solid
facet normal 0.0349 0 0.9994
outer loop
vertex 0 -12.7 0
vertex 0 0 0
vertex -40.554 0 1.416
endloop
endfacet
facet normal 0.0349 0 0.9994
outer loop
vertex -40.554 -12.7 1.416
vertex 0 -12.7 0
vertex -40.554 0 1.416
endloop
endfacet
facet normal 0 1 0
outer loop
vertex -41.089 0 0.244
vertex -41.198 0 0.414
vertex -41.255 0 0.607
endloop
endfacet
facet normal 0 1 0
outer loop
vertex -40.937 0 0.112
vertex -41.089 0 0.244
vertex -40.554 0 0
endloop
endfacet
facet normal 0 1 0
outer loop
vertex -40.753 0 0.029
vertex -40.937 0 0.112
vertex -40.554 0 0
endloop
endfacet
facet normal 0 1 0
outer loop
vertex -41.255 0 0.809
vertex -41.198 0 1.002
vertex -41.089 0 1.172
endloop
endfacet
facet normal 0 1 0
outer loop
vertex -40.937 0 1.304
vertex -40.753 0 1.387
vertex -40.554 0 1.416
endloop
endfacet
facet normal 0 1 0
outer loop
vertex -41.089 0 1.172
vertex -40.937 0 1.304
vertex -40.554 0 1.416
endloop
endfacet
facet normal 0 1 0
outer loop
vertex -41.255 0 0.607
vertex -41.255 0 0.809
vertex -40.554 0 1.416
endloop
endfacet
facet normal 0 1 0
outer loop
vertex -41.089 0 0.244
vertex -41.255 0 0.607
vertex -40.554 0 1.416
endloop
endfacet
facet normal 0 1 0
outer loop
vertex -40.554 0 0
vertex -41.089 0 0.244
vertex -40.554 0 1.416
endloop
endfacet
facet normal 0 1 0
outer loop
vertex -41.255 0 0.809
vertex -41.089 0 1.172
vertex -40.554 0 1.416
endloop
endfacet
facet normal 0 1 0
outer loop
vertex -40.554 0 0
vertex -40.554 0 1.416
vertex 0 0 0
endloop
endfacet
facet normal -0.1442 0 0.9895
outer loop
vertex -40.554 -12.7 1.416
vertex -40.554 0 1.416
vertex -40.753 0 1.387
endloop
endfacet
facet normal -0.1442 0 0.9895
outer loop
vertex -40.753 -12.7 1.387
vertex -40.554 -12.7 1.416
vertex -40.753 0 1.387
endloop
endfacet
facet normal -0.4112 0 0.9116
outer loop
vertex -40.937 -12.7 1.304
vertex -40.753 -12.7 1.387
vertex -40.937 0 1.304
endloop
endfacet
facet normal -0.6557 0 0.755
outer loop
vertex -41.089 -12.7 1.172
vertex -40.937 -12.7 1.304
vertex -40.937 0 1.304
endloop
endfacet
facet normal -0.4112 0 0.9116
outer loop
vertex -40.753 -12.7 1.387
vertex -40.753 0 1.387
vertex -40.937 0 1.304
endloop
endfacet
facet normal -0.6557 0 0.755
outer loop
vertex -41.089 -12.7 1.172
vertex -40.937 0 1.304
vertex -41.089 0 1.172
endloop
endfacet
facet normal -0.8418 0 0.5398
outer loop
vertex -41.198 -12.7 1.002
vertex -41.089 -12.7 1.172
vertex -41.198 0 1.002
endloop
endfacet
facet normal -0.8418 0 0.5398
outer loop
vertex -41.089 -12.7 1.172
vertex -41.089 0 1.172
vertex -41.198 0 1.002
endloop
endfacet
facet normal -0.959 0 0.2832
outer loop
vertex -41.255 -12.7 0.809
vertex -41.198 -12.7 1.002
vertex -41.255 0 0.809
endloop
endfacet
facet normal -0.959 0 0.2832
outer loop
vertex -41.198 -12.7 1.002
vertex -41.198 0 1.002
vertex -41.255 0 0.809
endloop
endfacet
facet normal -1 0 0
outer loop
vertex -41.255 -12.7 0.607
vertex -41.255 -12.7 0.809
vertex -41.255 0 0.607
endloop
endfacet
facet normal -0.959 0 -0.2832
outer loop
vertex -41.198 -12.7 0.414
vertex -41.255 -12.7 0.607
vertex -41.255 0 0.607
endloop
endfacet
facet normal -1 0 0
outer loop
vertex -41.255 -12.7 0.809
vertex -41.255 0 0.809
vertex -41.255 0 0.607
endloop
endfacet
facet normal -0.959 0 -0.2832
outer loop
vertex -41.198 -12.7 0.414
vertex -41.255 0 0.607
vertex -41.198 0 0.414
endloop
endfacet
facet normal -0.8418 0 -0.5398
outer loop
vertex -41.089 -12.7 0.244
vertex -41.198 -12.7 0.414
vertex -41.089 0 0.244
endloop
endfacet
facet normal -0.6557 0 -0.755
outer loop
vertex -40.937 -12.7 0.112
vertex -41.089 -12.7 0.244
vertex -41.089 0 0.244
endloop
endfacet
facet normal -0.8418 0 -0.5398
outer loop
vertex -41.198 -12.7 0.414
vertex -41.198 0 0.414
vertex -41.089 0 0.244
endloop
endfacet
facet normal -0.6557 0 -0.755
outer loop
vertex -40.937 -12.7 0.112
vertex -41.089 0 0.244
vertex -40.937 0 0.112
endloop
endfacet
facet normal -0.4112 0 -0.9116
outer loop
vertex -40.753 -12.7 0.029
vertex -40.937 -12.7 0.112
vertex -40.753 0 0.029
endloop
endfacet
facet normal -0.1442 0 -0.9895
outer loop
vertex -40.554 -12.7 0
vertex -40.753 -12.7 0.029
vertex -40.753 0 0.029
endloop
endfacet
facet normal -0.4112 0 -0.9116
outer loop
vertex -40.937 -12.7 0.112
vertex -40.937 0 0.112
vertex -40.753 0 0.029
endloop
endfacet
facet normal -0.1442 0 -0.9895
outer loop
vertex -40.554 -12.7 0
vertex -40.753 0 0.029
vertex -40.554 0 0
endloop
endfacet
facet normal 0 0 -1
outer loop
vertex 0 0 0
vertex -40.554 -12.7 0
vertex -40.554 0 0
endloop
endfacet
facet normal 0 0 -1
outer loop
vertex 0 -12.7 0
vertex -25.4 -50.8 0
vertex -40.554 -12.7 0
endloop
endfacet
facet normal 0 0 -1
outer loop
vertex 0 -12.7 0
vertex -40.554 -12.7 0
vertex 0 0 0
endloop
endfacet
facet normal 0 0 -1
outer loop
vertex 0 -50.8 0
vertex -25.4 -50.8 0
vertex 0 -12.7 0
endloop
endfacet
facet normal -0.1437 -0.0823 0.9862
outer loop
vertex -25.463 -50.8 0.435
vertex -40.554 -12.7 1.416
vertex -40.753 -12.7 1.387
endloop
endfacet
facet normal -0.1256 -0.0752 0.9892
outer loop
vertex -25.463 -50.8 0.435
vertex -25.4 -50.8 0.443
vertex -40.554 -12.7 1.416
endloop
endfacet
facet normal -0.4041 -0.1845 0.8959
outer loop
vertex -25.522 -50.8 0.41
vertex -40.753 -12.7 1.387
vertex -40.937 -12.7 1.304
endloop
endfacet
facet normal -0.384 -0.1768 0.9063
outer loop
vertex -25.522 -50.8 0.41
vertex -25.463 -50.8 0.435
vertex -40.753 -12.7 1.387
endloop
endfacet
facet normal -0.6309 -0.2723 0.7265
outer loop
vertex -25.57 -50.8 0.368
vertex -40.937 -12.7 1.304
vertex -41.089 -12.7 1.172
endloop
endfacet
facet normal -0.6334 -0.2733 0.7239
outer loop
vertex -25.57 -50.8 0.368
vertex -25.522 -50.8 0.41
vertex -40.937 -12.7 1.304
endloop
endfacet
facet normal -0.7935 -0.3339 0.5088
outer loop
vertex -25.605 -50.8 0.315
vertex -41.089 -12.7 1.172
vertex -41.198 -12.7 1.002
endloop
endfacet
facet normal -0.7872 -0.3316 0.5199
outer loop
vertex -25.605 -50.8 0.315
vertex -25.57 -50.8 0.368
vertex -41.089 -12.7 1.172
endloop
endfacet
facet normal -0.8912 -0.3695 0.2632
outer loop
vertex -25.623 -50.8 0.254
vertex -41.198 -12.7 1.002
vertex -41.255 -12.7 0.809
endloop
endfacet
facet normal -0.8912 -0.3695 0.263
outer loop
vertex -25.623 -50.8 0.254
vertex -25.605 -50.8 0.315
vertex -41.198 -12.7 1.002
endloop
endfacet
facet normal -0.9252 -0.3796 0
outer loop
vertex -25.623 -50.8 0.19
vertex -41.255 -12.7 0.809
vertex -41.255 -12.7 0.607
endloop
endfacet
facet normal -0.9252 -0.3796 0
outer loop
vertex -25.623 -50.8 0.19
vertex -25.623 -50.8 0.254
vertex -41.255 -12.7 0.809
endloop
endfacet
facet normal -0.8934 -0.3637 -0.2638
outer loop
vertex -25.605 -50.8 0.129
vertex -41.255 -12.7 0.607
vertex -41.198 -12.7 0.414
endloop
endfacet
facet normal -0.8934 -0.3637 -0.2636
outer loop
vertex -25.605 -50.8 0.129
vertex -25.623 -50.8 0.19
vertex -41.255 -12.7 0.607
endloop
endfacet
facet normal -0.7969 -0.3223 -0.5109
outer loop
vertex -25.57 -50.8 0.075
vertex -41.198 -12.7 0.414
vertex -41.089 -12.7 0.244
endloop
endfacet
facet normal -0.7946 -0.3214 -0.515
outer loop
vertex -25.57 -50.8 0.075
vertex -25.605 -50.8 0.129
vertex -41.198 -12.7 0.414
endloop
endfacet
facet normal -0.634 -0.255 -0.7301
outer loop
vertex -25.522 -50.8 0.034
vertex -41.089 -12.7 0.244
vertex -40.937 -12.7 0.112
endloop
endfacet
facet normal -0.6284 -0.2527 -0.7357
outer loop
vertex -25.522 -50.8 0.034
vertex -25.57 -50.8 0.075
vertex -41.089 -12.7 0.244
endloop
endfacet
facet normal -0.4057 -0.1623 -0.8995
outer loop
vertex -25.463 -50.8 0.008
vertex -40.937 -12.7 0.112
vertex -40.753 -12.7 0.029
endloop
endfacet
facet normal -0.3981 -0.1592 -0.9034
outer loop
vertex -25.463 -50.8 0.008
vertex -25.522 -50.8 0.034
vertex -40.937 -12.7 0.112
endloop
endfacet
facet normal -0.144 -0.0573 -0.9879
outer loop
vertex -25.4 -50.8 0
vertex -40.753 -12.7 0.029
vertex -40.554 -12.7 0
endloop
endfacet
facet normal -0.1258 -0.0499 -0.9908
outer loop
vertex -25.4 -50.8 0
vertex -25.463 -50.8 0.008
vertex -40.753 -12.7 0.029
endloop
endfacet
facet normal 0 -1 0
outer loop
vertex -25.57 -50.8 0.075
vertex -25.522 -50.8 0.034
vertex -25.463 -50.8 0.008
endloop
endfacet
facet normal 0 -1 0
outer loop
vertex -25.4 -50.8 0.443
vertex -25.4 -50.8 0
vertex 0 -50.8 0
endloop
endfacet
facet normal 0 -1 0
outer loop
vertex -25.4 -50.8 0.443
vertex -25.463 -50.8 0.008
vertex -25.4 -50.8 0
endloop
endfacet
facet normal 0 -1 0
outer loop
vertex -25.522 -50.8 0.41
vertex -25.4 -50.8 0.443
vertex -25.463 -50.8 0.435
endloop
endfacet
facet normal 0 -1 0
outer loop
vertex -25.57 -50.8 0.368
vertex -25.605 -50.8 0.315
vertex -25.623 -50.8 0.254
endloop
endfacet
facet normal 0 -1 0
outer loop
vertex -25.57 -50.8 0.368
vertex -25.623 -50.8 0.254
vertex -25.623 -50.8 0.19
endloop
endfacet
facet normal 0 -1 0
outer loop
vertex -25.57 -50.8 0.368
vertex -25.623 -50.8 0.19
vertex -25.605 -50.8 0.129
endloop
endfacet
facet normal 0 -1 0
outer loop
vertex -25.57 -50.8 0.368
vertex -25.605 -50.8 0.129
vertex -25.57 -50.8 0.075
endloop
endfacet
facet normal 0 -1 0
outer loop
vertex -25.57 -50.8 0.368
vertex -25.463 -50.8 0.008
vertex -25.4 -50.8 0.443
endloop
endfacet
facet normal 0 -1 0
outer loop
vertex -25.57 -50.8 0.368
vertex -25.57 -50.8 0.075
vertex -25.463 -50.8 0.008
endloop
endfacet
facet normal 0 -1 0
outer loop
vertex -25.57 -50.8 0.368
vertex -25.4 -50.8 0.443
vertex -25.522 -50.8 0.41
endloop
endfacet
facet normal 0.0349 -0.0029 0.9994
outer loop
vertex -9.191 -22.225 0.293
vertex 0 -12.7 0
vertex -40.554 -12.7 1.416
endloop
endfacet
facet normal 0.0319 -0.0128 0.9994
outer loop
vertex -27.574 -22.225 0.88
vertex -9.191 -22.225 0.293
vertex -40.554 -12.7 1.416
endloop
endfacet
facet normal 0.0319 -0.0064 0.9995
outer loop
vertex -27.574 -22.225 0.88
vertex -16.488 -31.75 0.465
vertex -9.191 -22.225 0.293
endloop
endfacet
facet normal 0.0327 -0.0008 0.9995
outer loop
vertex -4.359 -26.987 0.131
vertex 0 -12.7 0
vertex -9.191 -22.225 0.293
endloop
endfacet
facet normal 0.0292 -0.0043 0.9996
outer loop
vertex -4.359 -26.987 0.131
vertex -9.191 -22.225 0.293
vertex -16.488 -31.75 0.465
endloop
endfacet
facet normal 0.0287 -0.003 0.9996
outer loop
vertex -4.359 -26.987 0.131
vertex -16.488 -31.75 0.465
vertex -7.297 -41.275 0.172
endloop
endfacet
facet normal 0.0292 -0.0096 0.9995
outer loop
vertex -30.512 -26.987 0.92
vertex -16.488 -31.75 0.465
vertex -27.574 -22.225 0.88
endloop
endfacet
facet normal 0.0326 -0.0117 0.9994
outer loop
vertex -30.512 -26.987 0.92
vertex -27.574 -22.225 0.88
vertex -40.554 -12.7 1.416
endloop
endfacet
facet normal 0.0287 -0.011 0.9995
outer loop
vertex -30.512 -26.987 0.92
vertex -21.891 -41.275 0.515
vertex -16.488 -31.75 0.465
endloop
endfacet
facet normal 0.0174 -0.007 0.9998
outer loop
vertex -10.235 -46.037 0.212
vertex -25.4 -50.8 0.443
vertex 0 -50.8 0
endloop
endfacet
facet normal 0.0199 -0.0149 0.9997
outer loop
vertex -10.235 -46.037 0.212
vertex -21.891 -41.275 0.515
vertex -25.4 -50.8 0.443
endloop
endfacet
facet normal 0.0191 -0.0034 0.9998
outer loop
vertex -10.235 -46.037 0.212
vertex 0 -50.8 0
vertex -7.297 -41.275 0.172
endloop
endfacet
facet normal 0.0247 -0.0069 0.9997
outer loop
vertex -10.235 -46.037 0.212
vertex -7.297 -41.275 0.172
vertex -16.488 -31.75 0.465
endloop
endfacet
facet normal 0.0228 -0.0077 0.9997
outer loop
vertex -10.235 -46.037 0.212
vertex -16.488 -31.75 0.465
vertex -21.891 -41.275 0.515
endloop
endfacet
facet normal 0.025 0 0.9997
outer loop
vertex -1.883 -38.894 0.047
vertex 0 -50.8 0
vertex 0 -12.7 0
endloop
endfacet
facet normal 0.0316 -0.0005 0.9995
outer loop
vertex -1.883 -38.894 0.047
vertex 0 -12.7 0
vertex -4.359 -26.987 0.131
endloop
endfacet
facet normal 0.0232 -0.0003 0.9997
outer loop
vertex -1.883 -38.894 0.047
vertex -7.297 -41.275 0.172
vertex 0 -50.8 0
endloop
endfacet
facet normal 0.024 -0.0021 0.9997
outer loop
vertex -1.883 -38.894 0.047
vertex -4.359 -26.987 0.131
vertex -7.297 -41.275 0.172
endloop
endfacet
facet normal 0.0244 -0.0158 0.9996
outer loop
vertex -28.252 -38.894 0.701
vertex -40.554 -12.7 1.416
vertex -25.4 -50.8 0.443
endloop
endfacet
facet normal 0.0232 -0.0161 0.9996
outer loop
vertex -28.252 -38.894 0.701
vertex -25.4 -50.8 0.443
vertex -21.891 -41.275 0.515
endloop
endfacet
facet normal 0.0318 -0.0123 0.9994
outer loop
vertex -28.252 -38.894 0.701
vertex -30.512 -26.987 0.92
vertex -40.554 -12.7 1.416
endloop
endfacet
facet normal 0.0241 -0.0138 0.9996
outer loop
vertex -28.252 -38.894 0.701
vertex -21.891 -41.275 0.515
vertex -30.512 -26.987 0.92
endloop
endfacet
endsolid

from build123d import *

# Parameters (mm, degrees)
F2_DEPTH = 12.7


with BuildPart() as f2:
    # F0 (on Front) → F2 (new body)
    with BuildSketch(Plane.XZ):
        with BuildLine():
            Line((-40.553772, 0), (0, 0))
            Line((0, 0), (-40.553772, 1.416169))
            ThreePointArc((-40.553772, 1.416169), (-41.261856, 0.708084), (-40.553772, 0))
        make_face()
    extrude(amount=F2_DEPTH)

    # F2_face (on face) → F4 section 0
    with BuildSketch(Plane(origin=(-27.404725, -12.7, 0.478357), x_dir=(1, 0, 0), z_dir=(0, -1, 0))):
        with BuildLine():
            Line((-13.149047, -0.478357), (27.404725, -0.478357))
            Line((27.404725, -0.478357), (-13.149047, 0.937812))
            ThreePointArc((-13.149047, 0.937812), (-13.857131, 0.229727), (-13.149047, -0.478357))
        make_face()
    # F3 (on offset) → F4 section 1
    with BuildSketch(Plane.XZ.offset(50.8)):
        with BuildLine():
            Line((-25.4, 0), (0, 0))
            Line((0, 0), (-25.4, 0.443359))
            ThreePointArc((-25.4, 0.443359), (-25.625583, 0.221679), (-25.4, 0))
        make_face()
    loft()


solid = f2.part
